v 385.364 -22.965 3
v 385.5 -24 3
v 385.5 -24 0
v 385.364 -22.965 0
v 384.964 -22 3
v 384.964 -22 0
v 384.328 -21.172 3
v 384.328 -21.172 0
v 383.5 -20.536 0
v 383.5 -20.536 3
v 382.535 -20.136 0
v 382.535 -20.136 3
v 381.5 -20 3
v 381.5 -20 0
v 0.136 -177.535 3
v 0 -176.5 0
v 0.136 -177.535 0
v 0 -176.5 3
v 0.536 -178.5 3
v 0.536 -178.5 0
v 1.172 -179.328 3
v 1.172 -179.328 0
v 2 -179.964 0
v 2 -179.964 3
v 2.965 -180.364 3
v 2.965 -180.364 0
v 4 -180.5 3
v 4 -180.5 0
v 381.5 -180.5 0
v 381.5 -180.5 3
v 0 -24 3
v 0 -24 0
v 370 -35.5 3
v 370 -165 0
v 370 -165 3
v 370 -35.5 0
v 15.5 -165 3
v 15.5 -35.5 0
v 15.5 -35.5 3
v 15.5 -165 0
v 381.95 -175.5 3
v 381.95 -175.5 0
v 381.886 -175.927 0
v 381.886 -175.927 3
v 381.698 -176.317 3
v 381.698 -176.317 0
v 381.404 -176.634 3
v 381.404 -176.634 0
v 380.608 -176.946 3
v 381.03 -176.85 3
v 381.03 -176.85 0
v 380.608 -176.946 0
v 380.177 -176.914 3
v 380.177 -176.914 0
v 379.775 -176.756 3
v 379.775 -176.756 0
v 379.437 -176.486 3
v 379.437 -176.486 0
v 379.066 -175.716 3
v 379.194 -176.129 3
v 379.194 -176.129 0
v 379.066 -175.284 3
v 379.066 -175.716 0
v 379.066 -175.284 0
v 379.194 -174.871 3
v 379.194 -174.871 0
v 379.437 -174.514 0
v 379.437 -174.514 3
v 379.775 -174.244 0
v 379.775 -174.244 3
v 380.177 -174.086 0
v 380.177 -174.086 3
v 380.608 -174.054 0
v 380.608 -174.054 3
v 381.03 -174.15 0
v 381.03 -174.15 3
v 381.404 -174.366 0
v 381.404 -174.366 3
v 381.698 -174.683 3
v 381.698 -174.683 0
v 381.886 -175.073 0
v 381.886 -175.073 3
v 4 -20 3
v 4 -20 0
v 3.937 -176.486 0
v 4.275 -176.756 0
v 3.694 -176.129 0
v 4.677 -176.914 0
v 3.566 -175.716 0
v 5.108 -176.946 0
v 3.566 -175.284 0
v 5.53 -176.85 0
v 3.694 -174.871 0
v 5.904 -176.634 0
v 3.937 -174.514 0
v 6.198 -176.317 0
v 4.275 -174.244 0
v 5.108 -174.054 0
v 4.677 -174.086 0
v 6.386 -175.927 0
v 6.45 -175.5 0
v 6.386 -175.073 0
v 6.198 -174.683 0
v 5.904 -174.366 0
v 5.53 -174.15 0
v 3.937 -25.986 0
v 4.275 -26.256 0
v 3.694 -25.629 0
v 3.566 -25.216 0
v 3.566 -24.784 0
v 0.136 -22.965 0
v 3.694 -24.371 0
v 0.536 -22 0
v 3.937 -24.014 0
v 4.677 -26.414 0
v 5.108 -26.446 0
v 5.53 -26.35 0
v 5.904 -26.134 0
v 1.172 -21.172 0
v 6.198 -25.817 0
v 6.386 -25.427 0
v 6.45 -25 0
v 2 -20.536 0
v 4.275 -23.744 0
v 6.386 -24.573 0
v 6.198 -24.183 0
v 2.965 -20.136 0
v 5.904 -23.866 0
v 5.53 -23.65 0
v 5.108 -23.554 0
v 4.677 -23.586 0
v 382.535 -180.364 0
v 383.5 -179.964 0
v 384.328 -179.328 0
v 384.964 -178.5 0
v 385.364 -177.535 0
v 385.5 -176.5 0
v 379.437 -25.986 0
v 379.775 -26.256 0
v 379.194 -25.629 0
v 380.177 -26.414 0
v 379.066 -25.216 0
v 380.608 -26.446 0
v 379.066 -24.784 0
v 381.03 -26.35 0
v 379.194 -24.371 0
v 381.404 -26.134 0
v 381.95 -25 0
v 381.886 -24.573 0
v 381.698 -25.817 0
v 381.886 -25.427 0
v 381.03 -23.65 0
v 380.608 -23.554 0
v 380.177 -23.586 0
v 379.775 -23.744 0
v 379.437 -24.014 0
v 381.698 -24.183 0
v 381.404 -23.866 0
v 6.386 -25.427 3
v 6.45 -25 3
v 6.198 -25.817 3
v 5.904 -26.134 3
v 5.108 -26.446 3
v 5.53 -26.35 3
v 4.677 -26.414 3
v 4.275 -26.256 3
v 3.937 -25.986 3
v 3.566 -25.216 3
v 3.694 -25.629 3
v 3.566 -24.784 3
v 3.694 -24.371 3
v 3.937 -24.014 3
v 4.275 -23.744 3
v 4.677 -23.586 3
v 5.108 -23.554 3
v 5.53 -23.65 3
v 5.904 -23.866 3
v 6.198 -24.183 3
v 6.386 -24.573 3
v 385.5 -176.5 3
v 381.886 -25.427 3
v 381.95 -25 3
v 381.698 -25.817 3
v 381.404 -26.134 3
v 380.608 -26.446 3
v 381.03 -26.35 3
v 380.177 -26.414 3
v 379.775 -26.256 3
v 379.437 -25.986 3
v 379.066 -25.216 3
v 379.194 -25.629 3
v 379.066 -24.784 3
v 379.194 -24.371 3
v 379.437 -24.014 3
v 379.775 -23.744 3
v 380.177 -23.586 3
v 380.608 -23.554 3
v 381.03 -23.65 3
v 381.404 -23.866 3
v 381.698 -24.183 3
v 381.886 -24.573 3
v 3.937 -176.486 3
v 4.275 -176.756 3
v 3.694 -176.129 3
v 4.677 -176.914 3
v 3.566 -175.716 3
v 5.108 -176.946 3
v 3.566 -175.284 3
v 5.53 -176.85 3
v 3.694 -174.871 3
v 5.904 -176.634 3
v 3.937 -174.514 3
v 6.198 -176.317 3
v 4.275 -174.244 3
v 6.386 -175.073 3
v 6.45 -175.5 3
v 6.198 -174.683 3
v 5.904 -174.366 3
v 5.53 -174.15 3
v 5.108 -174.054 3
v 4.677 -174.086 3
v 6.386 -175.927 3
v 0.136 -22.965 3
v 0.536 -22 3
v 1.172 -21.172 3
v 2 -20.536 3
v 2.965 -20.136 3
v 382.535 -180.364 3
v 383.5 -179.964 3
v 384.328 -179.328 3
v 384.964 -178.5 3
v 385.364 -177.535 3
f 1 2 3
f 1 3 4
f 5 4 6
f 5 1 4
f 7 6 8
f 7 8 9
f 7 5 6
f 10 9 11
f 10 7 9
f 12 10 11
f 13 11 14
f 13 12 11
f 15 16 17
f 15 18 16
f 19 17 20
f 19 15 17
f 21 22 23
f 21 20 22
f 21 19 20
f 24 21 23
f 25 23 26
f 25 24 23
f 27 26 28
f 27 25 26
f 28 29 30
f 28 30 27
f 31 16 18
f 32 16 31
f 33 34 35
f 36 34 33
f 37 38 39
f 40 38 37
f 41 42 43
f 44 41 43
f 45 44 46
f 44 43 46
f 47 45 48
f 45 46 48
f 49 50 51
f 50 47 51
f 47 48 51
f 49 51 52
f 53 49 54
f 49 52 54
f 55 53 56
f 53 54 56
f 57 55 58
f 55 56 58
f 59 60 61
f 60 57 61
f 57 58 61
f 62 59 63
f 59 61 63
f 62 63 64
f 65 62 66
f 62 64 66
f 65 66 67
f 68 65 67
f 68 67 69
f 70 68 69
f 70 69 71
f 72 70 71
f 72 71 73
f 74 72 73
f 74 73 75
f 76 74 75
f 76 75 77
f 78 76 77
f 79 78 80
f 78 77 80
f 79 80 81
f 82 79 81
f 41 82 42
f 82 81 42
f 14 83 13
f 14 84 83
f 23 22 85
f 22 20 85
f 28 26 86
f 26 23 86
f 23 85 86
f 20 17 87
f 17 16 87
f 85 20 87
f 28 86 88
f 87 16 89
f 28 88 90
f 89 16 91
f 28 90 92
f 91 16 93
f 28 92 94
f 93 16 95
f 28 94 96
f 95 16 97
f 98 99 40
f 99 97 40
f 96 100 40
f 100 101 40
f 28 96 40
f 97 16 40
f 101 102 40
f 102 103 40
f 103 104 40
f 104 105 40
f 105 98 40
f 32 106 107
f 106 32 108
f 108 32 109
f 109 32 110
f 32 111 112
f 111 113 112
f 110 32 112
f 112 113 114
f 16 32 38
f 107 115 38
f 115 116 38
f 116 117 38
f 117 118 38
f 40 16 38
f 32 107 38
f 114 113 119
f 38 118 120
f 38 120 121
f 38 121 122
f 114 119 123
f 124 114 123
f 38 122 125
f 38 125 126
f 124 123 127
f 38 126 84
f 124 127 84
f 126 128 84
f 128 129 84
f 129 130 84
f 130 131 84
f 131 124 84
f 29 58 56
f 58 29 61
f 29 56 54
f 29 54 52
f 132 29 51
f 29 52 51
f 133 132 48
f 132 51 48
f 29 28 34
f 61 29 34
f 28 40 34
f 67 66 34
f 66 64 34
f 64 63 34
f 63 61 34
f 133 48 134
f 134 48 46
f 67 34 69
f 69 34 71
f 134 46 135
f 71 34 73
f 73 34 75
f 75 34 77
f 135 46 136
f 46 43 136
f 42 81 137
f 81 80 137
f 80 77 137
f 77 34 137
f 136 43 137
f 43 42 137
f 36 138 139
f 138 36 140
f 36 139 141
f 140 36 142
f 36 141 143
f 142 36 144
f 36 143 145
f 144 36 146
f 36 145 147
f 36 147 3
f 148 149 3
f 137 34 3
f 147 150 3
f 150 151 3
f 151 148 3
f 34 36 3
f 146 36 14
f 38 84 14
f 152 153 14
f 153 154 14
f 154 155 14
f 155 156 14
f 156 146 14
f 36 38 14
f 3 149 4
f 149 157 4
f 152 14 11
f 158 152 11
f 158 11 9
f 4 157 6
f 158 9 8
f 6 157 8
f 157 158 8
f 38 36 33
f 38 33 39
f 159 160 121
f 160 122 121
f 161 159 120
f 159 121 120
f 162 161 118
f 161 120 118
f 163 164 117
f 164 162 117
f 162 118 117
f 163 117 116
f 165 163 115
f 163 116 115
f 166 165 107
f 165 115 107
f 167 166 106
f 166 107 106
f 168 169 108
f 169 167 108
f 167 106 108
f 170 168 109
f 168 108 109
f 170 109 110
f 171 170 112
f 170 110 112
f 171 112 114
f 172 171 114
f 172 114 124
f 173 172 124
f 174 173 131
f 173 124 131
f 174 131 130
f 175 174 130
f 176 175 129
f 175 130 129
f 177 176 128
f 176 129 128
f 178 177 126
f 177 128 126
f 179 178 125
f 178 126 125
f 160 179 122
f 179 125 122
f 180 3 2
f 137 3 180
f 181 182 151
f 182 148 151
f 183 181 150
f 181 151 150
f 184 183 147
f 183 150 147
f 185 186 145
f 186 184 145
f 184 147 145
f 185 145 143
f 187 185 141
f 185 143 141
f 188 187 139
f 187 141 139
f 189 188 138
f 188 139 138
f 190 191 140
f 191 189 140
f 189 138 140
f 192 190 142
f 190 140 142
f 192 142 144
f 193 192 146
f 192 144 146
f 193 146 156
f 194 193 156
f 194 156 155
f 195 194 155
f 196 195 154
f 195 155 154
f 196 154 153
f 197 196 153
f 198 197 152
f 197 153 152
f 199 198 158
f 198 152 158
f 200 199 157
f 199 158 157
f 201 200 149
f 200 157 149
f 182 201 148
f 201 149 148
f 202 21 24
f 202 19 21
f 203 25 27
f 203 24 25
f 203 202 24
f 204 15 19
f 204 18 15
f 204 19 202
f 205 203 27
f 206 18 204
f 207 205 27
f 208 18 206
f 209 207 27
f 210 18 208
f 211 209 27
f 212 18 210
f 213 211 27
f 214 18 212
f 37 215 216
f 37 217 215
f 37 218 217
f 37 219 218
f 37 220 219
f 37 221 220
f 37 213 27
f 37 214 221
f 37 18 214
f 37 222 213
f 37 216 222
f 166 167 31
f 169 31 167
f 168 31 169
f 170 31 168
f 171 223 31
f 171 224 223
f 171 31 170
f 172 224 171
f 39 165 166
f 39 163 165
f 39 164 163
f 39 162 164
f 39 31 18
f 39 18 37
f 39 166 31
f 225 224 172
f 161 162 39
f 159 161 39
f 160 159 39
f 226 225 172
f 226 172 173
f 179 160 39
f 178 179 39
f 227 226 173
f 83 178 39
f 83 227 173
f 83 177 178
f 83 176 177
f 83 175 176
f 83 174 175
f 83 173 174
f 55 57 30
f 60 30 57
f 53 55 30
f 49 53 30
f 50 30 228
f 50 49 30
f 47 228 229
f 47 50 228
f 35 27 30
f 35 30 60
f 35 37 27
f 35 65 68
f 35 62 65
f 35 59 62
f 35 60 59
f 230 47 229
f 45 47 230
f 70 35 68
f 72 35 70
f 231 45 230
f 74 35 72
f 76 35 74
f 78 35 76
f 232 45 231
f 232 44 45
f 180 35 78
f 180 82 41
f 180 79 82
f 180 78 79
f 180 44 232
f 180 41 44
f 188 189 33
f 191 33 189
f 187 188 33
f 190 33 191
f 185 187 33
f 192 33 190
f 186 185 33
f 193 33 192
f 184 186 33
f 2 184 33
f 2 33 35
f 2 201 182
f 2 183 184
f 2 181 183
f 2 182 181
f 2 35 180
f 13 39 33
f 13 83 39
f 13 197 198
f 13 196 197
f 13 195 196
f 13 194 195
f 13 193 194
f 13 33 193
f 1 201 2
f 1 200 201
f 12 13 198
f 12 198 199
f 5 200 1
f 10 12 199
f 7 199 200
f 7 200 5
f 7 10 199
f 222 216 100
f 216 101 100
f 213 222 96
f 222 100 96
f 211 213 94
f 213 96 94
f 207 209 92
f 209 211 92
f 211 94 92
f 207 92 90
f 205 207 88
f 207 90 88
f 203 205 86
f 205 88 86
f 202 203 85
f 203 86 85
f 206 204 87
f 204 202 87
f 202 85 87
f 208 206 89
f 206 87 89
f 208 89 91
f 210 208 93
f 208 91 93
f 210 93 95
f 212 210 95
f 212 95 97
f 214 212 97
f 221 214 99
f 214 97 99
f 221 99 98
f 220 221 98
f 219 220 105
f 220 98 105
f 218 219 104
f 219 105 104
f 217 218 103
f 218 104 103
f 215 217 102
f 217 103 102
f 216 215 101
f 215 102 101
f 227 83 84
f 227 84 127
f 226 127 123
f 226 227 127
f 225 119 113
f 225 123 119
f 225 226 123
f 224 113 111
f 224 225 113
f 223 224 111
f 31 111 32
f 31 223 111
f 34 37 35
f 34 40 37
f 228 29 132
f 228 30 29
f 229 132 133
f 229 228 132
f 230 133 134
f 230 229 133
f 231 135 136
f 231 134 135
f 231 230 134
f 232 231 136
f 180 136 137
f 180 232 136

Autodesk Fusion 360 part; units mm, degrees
sketch "Sketch1" plane through (0, 0, 0) normal (0, 0, 1) x (1, 0, 0)
  line L0 (0, 0) -> (385.5, 0)
  line L1 (385.5, 0) -> (385.5, 160.5)
  line L2 (385.5, 160.5) -> (0, 160.5)
  line L3 (0, 160.5) -> (0, 0)
  line L4 (10, 150.5) -> (375.5, 150.5)
  line L5 (375.5, 150.5) -> (375.5, 10)
  line L6 (375.5, 10) -> (10, 10)
  line L7 (10, 10) -> (10, 150.5)
  circle A0 centre (5, 155.5) radius 1.45
  circle A1 centre (5, 5) radius 1.45
  circle A2 centre (380.5, 5) radius 1.45
  circle A3 centre (380.5, 155.5) radius 1.45
  dimension "d1" = 160.5
  dimension "d2" = 385.5
  dimension "d3" = 10
  dimension "d4" = 10
  dimension "d5" = 10
  dimension "d6" = 10
  dimension "d7" = 2.9
  dimension "d8" = 2.9
  dimension "d9" = 2.9
  dimension "d10" = 2.9
  dimension "d11" = 5
  dimension "d12" = 5
  dimension "d13" = 5
  dimension "d14" = 5
  dimension "d15" = 5
  dimension "d16" = 5
  dimension "d17" = 5
  dimension "d18" = 5
sketch "Sketch2" plane through (0, 0, 0) normal (0, 0, 1) x (1, 0, 0)
  line L0 (0, 0) -> (385.5, 0)
  line L1 (385.5, 0) -> (385.5, 160.5)
  line L2 (385.5, 160.5) -> (0, 160.5)
  line L3 (0, 160.5) -> (0, 0)
  line L4 (375.5, 10) -> (10, 10)
  line L5 (10, 10) -> (10, 150.5)
  line L6 (10, 150.5) -> (375.5, 150.5)
  line L7 (375.5, 150.5) -> (375.5, 10)
  dimension "d21" = 160.5
  dimension "d22" = 385.5
  dimension "d23" = 10
  dimension "d24" = 10
  dimension "d25" = 365.5
  dimension "d26" = 140.5
sketch "Sketch3" plane through (0, 0, 0) normal (0, 1, 0) x (1, 0, 0)
sketch "Sketch4" plane through (0, 0, 0) normal (0, 0, 1) x (1, 0, 0)
  line L0 (0, -20) -> (385.5, -20)
  line L1 (385.5, -20) -> (385.5, -180.5)
  line L2 (385.5, -180.5) -> (0, -180.5)
  line L3 (0, -180.5) -> (0, -20)
  line L4 (375.5, -170.5) -> (10, -170.5)
  line L5 (10, -170.5) -> (10, -30)
  line L6 (10, -30) -> (375.5, -30)
  line L7 (375.5, -30) -> (375.5, -170.5)
  circle A0 centre (5, -175.5) radius 1.45
  circle A1 centre (5, -25) radius 1.45
  circle A2 centre (380.5, -25) radius 1.45
  circle A3 centre (380.5, -175.5) radius 1.45
  dimension "d29" = 160.5
  dimension "d30" = 385.5
  dimension "d31" = 10
  dimension "d32" = 10
  dimension "d33" = 10
  dimension "d34" = 10
  dimension "d35" = 2.9
  dimension "d36" = 5
  dimension "d37" = 5
  dimension "d38" = 2.9
  dimension "d39" = 5
  dimension "d40" = 5
  dimension "d41" = 2.9
  dimension "d42" = 5
  dimension "d43" = 5
  dimension "d44" = 2.9
  dimension "d45" = 5
  dimension "d46" = 5
extrude "Extrude3" add sketch "Sketch4" along normal blind 3 contours L0 L1 L2 L3 | L4 L5 L6 L7
sketch "Sketch5" plane through (0, 0, 3) normal (0, 0, 1) x (-1, 0, 0)
  circle A0 centre (-15.5, -145) radius 3.3
  circle A1 centre (-15.5, -145) radius 1.3
  circle A2 centre (-15.5, -15.5) radius 1.3
  circle A3 centre (-15.5, -15.5) radius 3.3
  circle A4 centre (-370, -15.5) radius 1.3
  circle A5 centre (-370, -15.5) radius 3.3
  circle A6 centre (-370, -145) radius 1.3
  circle A7 centre (-370, -145) radius 3.3
  line L0 (-375.5, -150.5) -> (-10, -150.5)
  line L1 (-10, -150.5) -> (-10, -10)
  line L2 (-10, -10) -> (-375.5, -10)
  line L3 (-375.5, -10) -> (-375.5, -150.5)
  dimension "d49" = 6.6
  dimension "d52" = 2.6
  dimension "d53" = 2.6
  dimension "d56" = 6.6
  dimension "d57" = 2.6
  dimension "d58" = 6.6
  dimension "d61" = 2.6
  dimension "d62" = 6.6
sketch "Sketch6" plane through (0, 0, 3) normal (0, 0, 1) x (-1, 0, 0)
  circle A0 centre (-5, 25) radius 1.45
  circle A1 centre (-5, 175.5) radius 1.45
  circle A2 centre (-380.5, 25) radius 1.45
  circle A3 centre (-380.5, 175.5) radius 1.45
  line L0 (0, 180.5) -> (-385.5, 180.5)
  line L1 (-385.5, 180.5) -> (-385.5, 20)
  line L2 (-385.5, 20) -> (0, 20)
  line L3 (0, 20) -> (0, 180.5)
sketch "Sketch7" plane through (0, 0, 0) normal (0, 0, -1) x (1, 0, 0)
  circle A0 centre (5, 25) radius 1.45
  circle A1 centre (5, 175.5) radius 1.45
  circle A2 centre (380.5, 25) radius 1.45
  circle A3 centre (380.5, 175.5) radius 1.45
  line L0 (385.5, 180.5) -> (0, 180.5)
  line L1 (0, 180.5) -> (0, 20)
  line L2 (0, 20) -> (385.5, 20)
  line L3 (385.5, 20) -> (385.5, 180.5)
  line L4 (0, 20) -> (385.5, 20)
  line L5 (385.5, 20) -> (385.5, 180.5)
  line L6 (385.5, 180.5) -> (0, 180.5)
  line L7 (0, 180.5) -> (0, 20)
  line L8 (0, 20) -> (385.5, 20)
  line L9 (385.5, 20) -> (385.5, 180.5)
  line L10 (385.5, 180.5) -> (0, 180.5)
  line L11 (0, 180.5) -> (0, 20)
  line L12 (0, 20) -> (385.5, 20)
  line L13 (385.5, 20) -> (385.5, 180.5)
  line L14 (385.5, 180.5) -> (0, 180.5)
  line L15 (0, 180.5) -> (0, 20)
  line L16 (15.5, 165) -> (370, 165)
  line L17 (370, 165) -> (370, 35.5)
  line L18 (370, 35.5) -> (15.5, 35.5)
  line L19 (15.5, 35.5) -> (15.5, 165)
  line L20 (0, 180.5) -> (385.5, 180.5)
  dimension "d68" = 15.5
  dimension "d70" = 15.5
  dimension "d71" = 15.5
  dimension "d72" = 15.5
extrude "Extrude5" cut sketch "Sketch7" against normal blind 150 contours L16 L17 L18 L19
fillet "Fillet5" radius 4 1 edges at (385.5, -180.5, 1.5)
fillet "Fillet6" radius 4 1 edges at (385.5, -20, 1.5)
fillet "Fillet7" radius 4 1 edges at (0, -180.5, 1.5)
fillet "Fillet8" radius 4 1 edges at (0, -20, 1.5)
